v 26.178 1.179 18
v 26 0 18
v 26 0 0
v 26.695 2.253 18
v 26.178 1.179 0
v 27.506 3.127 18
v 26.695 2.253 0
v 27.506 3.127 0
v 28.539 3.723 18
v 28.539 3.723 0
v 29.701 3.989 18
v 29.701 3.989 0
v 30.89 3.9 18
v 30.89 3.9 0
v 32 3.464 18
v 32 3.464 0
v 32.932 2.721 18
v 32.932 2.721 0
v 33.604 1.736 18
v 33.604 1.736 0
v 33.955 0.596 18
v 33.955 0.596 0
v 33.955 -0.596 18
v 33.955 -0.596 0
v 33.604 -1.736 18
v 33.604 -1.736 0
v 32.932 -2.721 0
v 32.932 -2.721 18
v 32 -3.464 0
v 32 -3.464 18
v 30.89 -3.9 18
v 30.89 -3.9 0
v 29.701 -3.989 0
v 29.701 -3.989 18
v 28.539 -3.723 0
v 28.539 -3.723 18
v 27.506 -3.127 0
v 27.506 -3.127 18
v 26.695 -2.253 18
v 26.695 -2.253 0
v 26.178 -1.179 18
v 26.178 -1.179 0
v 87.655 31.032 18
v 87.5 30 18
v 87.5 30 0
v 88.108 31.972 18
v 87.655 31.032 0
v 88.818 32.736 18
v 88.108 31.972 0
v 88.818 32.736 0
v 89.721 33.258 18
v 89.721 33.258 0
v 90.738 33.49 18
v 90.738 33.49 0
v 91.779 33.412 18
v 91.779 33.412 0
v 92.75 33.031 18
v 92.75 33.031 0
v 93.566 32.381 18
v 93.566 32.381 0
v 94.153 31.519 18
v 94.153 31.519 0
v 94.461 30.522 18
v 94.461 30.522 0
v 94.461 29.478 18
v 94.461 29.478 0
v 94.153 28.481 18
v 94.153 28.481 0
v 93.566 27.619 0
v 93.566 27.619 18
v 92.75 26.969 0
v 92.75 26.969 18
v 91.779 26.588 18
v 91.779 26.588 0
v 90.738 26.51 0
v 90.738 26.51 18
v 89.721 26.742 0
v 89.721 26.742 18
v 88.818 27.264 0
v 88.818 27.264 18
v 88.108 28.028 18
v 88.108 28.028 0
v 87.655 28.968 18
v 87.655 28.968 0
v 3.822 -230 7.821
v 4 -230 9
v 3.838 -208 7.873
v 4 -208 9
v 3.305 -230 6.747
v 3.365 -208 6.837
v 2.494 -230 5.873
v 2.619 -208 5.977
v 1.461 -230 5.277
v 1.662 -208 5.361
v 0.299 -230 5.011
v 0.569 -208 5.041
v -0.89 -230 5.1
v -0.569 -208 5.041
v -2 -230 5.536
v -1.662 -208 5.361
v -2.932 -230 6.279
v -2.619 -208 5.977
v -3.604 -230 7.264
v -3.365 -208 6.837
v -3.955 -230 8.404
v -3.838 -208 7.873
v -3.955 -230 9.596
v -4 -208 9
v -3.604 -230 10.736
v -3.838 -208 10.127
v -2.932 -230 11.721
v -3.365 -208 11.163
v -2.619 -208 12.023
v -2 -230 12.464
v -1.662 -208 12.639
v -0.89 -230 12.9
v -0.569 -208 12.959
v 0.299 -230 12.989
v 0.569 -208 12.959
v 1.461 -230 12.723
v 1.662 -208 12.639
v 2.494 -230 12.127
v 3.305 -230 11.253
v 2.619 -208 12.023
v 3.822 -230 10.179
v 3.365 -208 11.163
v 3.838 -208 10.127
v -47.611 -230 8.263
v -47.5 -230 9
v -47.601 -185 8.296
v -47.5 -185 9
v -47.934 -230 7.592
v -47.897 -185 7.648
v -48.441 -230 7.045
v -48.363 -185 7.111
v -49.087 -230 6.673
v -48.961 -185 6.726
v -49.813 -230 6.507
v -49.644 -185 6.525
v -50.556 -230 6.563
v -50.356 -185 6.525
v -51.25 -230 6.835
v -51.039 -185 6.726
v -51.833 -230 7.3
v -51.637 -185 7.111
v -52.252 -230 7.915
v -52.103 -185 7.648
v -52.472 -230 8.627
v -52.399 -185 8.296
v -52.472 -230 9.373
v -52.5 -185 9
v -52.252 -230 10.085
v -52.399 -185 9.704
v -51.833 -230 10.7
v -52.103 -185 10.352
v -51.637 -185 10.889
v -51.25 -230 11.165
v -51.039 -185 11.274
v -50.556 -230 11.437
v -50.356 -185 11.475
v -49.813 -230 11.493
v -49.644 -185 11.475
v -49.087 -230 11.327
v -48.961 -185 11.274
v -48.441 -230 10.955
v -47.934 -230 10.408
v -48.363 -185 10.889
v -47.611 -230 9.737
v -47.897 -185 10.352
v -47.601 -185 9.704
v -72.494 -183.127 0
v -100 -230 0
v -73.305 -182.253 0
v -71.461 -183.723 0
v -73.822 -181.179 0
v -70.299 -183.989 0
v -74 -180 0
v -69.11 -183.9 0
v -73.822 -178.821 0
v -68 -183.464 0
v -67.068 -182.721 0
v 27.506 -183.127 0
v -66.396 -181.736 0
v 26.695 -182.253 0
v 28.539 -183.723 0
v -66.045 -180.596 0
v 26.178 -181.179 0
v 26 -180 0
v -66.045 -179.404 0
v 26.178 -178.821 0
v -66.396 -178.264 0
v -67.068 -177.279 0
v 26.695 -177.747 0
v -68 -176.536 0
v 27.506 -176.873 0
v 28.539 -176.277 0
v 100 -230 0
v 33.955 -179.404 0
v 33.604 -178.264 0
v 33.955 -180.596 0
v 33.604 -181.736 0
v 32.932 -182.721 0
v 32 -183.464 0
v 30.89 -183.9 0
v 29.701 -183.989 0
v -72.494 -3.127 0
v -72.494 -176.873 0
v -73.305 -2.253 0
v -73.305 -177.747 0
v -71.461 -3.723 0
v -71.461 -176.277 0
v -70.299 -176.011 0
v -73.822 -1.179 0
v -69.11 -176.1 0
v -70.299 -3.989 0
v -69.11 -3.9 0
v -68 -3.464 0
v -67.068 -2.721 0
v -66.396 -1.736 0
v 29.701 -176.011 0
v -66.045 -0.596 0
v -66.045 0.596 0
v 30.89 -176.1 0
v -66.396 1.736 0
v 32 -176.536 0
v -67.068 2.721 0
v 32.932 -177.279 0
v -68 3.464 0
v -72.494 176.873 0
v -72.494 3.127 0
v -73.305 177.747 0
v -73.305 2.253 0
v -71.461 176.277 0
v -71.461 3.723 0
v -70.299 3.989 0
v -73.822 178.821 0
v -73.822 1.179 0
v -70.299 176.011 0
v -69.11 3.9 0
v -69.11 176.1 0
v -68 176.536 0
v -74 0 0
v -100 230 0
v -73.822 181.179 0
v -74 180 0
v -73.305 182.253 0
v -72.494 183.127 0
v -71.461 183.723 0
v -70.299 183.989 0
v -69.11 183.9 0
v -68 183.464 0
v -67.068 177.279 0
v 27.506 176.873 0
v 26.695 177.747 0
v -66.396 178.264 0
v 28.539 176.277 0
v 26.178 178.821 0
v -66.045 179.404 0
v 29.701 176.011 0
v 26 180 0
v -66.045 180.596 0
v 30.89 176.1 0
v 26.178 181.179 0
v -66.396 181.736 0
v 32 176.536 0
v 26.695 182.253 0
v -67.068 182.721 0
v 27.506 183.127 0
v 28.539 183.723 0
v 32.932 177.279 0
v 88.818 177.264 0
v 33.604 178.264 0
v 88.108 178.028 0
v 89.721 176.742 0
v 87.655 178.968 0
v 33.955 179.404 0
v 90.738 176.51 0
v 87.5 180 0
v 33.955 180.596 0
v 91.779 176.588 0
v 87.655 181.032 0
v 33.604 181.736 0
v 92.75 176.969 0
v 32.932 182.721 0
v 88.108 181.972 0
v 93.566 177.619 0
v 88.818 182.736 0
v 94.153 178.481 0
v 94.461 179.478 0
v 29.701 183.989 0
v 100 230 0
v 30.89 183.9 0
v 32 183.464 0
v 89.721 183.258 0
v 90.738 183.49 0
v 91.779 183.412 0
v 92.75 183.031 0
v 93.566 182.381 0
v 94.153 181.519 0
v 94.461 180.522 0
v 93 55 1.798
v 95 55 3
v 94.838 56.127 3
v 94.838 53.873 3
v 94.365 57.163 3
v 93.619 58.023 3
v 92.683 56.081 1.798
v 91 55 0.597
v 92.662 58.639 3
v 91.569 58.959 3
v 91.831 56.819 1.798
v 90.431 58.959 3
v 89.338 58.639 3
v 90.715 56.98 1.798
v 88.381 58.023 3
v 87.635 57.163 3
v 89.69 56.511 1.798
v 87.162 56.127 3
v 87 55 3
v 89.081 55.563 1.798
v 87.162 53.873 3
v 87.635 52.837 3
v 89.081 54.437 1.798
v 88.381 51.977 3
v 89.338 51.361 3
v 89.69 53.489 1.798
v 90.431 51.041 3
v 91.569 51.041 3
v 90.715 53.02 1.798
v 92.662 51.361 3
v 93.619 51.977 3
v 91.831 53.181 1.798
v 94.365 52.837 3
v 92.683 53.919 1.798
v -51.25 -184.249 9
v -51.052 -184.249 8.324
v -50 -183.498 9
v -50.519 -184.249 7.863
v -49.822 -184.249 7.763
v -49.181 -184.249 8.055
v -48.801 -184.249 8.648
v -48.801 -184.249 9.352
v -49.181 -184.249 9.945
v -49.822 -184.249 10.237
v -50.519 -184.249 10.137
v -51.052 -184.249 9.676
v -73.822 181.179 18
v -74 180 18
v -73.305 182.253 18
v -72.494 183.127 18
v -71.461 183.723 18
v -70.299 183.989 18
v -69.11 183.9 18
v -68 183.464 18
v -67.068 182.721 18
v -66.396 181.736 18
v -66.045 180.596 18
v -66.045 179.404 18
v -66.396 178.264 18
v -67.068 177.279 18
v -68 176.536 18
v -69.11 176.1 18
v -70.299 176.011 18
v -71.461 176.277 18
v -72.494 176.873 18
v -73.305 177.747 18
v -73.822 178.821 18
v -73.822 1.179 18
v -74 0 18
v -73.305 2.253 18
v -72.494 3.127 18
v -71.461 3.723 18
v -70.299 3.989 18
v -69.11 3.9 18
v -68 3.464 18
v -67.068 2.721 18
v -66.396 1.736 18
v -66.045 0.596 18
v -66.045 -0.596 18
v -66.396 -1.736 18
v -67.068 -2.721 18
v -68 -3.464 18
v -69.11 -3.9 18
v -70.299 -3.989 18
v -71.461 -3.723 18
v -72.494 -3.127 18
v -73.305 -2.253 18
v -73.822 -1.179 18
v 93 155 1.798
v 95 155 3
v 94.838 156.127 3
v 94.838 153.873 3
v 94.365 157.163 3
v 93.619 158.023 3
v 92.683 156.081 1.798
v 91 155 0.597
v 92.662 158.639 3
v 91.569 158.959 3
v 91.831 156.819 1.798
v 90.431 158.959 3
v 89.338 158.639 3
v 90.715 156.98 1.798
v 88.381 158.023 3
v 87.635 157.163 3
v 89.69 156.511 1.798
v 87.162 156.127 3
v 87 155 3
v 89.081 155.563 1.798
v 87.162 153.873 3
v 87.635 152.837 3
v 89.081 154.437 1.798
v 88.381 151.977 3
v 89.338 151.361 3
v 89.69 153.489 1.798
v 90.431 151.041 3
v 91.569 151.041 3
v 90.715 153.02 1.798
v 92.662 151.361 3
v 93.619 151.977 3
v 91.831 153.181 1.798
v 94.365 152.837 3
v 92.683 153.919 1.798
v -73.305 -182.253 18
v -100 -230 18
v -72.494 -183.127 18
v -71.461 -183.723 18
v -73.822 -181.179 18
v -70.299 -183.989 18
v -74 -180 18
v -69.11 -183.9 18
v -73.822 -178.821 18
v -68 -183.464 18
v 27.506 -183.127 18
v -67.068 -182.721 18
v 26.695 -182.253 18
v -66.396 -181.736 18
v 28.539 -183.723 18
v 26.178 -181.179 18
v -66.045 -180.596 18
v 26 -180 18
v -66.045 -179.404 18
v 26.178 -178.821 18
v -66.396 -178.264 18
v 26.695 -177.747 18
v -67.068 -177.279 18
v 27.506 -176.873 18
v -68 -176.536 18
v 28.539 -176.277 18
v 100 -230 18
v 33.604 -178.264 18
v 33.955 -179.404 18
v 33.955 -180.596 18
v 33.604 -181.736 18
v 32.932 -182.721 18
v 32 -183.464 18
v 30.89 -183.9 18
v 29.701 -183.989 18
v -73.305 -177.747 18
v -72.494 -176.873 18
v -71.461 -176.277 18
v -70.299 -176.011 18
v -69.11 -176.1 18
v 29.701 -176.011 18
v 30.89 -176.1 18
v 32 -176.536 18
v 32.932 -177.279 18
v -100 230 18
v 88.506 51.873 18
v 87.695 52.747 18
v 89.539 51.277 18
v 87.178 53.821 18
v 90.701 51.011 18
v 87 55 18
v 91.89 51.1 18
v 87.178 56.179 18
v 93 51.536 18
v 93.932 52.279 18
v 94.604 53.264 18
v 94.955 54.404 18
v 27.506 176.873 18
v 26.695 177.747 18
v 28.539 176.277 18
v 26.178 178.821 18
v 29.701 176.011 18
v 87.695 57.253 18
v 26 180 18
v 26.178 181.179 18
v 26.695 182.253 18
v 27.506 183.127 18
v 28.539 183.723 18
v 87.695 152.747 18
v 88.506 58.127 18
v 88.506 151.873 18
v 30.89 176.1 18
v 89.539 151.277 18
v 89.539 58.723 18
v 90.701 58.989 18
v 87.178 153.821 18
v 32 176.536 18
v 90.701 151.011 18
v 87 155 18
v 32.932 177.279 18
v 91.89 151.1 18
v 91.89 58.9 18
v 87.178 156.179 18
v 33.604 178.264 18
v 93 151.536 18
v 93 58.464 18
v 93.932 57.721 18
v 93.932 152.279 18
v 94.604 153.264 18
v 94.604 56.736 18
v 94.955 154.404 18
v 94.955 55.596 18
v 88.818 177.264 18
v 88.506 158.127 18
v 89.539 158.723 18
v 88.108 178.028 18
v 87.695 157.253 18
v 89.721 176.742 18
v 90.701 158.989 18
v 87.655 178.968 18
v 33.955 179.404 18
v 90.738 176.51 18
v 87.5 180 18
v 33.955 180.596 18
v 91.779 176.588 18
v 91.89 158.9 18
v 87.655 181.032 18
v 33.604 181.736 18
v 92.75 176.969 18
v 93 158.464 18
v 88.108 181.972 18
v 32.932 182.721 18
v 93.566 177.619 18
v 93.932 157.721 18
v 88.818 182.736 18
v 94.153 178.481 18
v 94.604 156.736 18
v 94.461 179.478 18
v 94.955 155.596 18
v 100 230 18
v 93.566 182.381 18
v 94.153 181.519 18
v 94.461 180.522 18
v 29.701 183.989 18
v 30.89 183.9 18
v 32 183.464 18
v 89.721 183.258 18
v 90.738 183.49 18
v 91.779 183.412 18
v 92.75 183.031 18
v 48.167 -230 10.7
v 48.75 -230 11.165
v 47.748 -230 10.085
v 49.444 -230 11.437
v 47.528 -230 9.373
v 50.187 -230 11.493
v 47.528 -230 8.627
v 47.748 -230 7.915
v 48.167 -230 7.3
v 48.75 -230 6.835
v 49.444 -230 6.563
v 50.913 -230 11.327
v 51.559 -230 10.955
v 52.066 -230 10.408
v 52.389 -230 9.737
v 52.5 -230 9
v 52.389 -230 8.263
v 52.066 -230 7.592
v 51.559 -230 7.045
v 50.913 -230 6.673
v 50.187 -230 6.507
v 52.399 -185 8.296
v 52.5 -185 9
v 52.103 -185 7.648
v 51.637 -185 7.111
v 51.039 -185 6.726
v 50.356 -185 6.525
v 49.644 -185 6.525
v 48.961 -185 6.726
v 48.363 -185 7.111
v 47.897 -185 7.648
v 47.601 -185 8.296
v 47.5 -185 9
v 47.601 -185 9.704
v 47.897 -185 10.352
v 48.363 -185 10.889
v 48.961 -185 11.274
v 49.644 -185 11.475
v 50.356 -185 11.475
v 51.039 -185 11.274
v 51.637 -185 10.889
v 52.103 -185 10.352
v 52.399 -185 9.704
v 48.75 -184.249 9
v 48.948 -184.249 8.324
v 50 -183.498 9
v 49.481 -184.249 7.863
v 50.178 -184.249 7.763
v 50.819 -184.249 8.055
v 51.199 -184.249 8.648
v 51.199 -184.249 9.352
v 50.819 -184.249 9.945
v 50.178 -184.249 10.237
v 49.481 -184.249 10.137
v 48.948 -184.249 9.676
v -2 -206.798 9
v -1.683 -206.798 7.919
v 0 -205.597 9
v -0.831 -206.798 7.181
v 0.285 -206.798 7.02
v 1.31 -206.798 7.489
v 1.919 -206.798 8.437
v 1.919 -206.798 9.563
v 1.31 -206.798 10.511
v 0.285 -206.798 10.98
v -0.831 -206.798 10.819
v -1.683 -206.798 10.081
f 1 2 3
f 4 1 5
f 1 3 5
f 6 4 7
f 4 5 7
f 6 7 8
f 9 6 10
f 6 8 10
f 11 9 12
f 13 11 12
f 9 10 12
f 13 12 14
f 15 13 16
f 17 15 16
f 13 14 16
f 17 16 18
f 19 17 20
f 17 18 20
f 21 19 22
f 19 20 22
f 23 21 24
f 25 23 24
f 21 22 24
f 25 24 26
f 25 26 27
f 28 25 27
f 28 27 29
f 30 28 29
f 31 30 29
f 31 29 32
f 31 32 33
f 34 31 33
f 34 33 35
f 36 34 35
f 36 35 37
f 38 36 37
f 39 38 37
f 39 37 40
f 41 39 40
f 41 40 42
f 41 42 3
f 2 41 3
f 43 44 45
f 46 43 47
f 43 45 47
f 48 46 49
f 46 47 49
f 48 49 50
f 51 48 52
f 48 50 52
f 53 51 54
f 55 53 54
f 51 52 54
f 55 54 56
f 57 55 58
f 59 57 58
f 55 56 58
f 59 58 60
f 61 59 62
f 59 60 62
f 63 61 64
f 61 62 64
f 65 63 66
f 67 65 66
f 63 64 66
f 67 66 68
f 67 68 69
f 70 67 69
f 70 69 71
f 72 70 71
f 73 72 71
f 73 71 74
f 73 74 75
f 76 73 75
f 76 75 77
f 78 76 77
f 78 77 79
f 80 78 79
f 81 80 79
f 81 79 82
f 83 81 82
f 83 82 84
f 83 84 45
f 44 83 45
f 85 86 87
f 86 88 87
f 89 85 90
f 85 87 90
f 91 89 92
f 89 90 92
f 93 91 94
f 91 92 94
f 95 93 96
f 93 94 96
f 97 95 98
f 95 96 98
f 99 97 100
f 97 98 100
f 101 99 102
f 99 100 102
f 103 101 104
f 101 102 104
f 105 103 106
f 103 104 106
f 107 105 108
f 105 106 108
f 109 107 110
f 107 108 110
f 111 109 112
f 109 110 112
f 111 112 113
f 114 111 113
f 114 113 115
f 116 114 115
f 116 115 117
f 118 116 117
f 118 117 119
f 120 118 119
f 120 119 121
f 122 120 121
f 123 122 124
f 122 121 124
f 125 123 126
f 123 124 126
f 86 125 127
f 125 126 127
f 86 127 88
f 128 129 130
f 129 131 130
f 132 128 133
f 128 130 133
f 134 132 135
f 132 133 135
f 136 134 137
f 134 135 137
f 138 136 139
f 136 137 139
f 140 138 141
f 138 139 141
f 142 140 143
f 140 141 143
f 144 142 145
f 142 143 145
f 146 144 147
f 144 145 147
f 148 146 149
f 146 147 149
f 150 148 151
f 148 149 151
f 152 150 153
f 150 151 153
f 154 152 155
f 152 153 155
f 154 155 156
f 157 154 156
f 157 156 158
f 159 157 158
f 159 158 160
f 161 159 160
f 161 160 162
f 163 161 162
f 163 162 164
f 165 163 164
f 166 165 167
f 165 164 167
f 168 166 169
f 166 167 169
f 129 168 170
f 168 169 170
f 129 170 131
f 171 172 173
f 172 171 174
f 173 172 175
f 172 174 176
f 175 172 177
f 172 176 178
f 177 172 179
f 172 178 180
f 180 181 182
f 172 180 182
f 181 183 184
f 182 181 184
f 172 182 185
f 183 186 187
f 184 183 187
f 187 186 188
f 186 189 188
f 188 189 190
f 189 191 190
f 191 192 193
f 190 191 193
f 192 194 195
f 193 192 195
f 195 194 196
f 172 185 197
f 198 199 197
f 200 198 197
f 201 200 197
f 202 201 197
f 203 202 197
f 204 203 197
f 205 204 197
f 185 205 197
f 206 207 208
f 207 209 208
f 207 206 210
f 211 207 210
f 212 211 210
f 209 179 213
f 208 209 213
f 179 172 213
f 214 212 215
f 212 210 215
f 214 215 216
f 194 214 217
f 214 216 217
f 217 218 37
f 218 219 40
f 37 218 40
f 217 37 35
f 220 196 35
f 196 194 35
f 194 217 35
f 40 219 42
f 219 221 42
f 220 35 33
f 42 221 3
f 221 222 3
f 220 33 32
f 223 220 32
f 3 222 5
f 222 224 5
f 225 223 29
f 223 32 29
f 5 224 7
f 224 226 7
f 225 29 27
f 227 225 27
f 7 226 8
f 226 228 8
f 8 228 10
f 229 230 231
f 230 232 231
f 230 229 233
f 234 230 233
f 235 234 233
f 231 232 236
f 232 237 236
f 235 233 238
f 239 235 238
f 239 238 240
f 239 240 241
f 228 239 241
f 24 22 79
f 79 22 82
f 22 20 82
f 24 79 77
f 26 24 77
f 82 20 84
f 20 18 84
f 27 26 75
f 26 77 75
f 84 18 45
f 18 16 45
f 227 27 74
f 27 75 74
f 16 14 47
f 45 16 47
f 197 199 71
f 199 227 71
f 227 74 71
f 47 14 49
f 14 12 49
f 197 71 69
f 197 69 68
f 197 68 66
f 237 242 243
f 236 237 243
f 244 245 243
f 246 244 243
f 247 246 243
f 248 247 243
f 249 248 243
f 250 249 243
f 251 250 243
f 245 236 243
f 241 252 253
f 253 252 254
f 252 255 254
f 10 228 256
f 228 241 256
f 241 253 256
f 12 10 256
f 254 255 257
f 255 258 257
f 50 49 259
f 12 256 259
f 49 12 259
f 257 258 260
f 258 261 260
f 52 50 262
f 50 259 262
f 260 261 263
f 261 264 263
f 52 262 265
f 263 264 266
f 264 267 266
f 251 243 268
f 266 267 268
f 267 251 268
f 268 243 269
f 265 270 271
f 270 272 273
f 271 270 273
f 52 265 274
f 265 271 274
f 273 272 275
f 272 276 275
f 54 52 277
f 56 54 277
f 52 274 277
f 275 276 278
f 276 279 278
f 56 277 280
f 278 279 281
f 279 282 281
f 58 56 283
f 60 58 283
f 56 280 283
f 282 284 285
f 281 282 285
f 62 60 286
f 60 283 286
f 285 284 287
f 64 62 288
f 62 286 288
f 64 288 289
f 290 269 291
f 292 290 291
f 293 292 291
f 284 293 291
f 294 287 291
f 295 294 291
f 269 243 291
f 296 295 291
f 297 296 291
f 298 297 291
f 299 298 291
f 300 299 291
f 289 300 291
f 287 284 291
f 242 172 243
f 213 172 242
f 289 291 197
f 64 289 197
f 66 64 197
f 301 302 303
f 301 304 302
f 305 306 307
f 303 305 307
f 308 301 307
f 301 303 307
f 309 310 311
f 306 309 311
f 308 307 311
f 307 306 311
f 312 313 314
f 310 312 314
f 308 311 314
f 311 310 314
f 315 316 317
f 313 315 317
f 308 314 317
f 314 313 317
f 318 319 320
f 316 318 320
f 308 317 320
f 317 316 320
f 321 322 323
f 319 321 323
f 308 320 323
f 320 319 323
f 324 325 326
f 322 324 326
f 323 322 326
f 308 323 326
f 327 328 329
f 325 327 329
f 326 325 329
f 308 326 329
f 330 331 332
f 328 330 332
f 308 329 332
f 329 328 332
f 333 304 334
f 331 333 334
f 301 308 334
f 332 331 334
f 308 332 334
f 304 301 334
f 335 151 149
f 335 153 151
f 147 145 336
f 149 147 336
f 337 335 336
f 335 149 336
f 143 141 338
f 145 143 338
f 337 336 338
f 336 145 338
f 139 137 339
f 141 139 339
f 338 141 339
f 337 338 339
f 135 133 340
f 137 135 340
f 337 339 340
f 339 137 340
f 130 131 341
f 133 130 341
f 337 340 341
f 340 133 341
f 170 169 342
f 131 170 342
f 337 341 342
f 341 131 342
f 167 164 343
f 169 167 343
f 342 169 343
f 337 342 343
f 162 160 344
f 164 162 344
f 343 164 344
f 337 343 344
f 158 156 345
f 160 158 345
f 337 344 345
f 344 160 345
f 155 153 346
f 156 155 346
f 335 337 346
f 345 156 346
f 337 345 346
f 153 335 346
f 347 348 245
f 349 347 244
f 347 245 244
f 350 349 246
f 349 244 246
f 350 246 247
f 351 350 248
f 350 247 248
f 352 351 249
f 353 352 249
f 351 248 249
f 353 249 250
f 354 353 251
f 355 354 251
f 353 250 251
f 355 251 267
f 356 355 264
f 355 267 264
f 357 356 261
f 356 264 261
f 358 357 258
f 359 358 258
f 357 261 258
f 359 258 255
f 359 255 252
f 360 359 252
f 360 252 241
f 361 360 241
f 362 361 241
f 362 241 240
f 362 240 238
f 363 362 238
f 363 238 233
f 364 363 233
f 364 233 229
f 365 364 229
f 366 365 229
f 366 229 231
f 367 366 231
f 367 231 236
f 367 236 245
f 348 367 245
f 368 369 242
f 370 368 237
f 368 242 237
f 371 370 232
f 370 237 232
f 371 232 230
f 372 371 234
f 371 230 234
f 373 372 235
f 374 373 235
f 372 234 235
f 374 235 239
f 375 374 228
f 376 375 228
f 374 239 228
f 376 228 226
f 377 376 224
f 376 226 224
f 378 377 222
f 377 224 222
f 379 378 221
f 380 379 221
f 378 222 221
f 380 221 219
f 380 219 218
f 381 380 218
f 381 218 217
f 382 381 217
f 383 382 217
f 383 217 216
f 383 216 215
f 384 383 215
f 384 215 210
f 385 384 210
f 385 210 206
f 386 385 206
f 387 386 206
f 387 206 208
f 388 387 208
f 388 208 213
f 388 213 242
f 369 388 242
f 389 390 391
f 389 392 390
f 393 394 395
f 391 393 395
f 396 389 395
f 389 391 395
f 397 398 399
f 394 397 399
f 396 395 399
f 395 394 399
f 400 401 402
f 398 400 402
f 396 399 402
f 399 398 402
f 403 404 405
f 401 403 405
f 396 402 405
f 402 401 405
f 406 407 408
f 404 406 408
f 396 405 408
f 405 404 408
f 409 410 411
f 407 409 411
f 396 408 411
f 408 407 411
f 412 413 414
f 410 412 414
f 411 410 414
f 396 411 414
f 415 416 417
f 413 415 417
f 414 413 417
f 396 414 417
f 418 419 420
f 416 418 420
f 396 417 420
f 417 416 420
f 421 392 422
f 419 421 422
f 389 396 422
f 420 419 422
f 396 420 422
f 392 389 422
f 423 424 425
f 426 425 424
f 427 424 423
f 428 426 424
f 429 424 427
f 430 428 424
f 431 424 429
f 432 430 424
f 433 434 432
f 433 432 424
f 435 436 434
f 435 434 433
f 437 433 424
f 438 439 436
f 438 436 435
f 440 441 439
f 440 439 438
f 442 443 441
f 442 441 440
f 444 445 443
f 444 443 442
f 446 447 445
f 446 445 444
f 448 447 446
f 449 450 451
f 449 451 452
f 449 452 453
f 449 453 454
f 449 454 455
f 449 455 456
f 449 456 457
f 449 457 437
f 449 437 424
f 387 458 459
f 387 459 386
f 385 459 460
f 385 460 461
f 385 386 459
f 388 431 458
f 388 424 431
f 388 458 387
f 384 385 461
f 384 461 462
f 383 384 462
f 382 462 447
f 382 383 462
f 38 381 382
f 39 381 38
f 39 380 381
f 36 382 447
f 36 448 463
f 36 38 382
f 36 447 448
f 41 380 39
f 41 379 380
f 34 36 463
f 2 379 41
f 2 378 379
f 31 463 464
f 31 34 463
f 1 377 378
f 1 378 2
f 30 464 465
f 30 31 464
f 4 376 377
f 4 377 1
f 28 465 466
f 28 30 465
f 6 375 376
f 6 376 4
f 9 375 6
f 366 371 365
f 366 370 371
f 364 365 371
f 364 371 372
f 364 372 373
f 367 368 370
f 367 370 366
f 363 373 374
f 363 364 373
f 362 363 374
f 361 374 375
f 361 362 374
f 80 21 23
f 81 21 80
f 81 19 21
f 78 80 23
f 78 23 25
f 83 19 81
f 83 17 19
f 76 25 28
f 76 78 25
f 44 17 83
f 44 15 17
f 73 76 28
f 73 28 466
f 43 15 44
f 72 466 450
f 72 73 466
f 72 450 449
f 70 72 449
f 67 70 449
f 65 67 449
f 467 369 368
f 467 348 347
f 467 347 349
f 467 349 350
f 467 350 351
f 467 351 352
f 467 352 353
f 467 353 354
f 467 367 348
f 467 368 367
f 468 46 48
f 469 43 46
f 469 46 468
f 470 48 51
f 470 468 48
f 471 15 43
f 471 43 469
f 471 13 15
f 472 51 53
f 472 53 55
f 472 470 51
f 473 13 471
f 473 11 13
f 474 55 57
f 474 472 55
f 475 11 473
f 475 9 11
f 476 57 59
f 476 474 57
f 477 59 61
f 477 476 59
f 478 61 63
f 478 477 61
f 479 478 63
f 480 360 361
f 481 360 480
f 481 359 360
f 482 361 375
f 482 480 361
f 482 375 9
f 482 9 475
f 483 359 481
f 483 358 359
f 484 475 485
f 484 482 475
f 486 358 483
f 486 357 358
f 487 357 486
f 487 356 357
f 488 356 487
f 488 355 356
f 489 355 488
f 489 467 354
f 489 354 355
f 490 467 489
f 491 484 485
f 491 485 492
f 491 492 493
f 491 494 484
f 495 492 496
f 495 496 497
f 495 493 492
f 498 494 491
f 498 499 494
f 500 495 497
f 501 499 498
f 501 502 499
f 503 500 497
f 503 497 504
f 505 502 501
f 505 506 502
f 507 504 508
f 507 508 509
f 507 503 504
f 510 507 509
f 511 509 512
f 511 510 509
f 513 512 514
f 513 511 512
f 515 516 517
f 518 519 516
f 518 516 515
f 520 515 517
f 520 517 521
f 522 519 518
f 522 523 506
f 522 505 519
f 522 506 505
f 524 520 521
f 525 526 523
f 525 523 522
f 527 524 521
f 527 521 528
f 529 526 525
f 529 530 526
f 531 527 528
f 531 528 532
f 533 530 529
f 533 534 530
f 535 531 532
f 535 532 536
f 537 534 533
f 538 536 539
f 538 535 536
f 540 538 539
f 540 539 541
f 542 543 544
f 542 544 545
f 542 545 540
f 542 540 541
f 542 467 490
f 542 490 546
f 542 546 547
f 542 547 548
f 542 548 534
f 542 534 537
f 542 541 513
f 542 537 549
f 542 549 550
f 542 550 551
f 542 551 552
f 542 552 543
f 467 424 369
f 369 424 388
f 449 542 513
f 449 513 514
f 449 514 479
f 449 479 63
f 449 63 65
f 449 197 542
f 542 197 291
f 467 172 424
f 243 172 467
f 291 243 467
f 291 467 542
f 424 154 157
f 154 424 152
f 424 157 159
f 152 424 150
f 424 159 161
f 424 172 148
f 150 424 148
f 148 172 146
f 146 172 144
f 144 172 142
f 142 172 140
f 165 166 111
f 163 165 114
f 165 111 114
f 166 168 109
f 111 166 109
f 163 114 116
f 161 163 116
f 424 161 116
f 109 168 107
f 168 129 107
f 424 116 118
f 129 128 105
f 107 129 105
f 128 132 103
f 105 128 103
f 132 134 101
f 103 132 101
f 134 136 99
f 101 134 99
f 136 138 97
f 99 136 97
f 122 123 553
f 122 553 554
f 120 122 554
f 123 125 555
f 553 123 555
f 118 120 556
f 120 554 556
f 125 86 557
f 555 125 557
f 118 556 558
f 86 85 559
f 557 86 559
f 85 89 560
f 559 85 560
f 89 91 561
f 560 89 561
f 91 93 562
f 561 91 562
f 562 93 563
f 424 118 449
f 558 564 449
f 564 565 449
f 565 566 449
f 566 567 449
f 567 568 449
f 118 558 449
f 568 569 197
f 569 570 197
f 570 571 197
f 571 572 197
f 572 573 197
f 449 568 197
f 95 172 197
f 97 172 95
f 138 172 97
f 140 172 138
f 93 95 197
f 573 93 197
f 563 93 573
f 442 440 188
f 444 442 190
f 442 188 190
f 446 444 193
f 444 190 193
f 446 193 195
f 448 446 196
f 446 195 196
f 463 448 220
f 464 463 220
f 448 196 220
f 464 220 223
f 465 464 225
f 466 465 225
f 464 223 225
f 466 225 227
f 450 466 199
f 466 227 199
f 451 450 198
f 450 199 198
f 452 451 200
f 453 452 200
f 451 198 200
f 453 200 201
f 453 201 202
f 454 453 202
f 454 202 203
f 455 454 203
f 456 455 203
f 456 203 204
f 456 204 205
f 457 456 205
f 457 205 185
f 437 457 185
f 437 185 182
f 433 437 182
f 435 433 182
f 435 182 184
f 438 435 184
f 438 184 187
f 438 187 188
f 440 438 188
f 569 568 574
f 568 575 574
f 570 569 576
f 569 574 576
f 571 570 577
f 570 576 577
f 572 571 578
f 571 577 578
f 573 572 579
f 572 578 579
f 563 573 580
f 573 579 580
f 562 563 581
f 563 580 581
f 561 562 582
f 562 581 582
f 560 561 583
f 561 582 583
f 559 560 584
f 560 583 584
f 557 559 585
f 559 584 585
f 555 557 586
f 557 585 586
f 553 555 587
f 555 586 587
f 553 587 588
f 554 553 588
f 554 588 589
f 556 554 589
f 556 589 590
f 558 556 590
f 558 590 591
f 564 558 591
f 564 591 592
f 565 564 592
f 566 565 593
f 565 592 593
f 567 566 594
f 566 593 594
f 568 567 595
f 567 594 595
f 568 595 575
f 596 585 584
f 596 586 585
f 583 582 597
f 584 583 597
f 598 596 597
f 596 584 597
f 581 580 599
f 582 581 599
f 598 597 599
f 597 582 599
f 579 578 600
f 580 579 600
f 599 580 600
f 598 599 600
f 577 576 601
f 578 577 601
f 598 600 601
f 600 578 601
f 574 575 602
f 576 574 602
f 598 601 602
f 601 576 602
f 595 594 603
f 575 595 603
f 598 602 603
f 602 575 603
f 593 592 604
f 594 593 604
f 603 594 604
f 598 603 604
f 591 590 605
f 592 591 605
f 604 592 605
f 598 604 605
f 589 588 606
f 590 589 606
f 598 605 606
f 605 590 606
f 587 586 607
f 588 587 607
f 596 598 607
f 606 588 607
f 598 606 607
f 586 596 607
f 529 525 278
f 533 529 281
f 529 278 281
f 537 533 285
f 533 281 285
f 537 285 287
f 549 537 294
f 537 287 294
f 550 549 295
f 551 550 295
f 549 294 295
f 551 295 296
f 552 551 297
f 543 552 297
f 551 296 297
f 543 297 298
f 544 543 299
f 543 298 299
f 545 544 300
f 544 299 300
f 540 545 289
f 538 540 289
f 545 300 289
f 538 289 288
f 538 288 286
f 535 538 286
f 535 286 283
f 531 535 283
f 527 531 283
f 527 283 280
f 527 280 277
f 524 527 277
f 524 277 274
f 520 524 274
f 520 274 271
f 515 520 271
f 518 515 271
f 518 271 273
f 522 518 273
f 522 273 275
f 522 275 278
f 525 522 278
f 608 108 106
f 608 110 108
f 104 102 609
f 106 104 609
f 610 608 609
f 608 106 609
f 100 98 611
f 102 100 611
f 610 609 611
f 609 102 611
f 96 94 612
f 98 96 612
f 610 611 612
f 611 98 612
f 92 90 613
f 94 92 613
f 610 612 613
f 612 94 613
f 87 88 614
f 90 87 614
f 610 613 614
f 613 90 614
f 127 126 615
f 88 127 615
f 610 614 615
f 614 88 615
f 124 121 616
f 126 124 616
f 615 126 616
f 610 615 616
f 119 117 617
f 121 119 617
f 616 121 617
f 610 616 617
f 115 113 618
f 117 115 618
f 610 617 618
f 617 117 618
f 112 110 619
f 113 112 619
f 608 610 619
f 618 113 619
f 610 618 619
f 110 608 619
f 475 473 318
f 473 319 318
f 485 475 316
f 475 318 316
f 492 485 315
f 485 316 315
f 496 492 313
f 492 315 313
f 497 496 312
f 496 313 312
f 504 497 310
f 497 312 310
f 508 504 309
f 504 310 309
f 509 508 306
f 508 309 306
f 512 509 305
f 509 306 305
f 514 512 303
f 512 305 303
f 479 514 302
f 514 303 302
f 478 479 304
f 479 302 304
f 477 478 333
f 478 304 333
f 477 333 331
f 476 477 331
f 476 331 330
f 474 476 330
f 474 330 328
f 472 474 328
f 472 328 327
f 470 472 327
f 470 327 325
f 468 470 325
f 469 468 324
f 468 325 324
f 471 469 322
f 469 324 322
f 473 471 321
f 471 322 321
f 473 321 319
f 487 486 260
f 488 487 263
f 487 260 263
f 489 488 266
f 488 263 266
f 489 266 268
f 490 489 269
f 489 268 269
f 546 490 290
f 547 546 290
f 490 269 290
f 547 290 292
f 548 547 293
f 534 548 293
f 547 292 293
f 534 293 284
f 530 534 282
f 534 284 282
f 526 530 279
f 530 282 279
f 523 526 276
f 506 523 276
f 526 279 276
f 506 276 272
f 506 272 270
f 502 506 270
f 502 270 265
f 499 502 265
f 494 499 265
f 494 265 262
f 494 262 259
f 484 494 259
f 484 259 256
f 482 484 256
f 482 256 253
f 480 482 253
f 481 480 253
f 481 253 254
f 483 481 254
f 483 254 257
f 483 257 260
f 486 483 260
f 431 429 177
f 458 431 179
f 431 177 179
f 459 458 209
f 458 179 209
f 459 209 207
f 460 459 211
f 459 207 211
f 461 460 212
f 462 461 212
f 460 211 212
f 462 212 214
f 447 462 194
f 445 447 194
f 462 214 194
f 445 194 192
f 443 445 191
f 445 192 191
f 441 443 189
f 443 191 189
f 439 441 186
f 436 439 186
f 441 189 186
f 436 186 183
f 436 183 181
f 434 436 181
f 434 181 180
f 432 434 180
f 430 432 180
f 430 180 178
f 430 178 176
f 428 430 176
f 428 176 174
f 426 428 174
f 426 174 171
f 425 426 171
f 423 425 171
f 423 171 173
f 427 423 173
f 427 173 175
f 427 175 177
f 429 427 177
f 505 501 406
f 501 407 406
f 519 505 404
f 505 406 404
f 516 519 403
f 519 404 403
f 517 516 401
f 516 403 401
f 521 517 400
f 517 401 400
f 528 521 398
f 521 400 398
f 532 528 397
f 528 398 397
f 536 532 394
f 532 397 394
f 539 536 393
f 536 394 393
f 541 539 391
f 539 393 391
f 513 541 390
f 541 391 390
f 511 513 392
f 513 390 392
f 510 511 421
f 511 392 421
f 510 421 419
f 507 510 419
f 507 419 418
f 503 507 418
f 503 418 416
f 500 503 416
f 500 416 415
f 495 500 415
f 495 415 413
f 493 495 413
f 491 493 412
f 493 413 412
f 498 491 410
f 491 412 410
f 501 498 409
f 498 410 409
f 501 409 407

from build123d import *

# Parameters (mm, degrees)
SKETCH1_W                  = 200
SKETCH1_H                  = 460
BOSS_EXTRUDE1_DEPTH        = 18
OTWORY_USTALAJ_CE_8_0MM1_D = 8
OTW_R_7_0_7_1_D            = 7
OTW_R_5_0_5_1_D            = 5
OTW_R_5_0_5_1_DEPTH        = 45
OTW_R_5_0_5_1_TIP          = 1.502151548
OTW_R_8_0_8_1_D            = 8
OTW_R_8_0_8_1_DEPTH        = 15
OTW_R_8_0_8_1_TIP          = 2.403442476
OTW_R_8_0_8_2_D            = 8
OTW_R_8_0_8_2_DEPTH        = 22
OTW_R_8_0_8_2_TIP          = 2.403442476


with BuildPart() as part:
    # Sketch1 → Boss-Extrude1 (new body)
    with BuildSketch(Plane.XY):
        Rectangle(SKETCH1_W, SKETCH1_H)
    extrude(amount=BOSS_EXTRUDE1_DEPTH)

    # Otwory ustalające Ø8.0mm1 (through all)
    with Locations(Plane.XY.offset(18)):
        with Locations((30, -180), (-70, -180), (-70, 0), (30, 0), (30, 180), (-70, 180)):
            Hole(OTWORY_USTALAJ_CE_8_0MM1_D / 2)

    # Otwór Ø7.0 (7)1 (through all)
    with Locations(Plane.XY.offset(18)):
        with Locations((91, 30), (91, 180)):
            Hole(OTW_R_7_0_7_1_D / 2)

    # Otwór Ø5.0 (5)1
    with Locations(Plane(origin=(0, -230, 0), x_dir=(-1, 0, 0), z_dir=(0, -1, 0))):
        with Locations((-50, -9), (50, -9)):
            Hole(OTW_R_5_0_5_1_D / 2, depth=OTW_R_5_0_5_1_DEPTH)
            with Locations((0, 0, -(OTW_R_5_0_5_1_DEPTH + OTW_R_5_0_5_1_TIP / 2))):  # 118° drill point
                Cone(0, OTW_R_5_0_5_1_D / 2, OTW_R_5_0_5_1_TIP, mode=Mode.SUBTRACT)

    # Otwór Ø8.0 (8)1
    with Locations(Plane.XY.offset(18)):
        with Locations((91, 55), (91, 155)):
            Hole(OTW_R_8_0_8_1_D / 2, depth=OTW_R_8_0_8_1_DEPTH)
            with Locations((0, 0, -(OTW_R_8_0_8_1_DEPTH + OTW_R_8_0_8_1_TIP / 2))):  # 118° drill point
                Cone(0, OTW_R_8_0_8_1_D / 2, OTW_R_8_0_8_1_TIP, mode=Mode.SUBTRACT)

    # Otwór Ø8.0 (8)2
    with Locations(Plane(origin=(0, -230, 0), x_dir=(-1, 0, 0), z_dir=(0, -1, 0))):
        with Locations((0, -9)):
            Hole(OTW_R_8_0_8_2_D / 2, depth=OTW_R_8_0_8_2_DEPTH)
            with Locations((0, 0, -(OTW_R_8_0_8_2_DEPTH + OTW_R_8_0_8_2_TIP / 2))):  # 118° drill point
                Cone(0, OTW_R_8_0_8_2_D / 2, OTW_R_8_0_8_2_TIP, mode=Mode.SUBTRACT)


solid = part.part
